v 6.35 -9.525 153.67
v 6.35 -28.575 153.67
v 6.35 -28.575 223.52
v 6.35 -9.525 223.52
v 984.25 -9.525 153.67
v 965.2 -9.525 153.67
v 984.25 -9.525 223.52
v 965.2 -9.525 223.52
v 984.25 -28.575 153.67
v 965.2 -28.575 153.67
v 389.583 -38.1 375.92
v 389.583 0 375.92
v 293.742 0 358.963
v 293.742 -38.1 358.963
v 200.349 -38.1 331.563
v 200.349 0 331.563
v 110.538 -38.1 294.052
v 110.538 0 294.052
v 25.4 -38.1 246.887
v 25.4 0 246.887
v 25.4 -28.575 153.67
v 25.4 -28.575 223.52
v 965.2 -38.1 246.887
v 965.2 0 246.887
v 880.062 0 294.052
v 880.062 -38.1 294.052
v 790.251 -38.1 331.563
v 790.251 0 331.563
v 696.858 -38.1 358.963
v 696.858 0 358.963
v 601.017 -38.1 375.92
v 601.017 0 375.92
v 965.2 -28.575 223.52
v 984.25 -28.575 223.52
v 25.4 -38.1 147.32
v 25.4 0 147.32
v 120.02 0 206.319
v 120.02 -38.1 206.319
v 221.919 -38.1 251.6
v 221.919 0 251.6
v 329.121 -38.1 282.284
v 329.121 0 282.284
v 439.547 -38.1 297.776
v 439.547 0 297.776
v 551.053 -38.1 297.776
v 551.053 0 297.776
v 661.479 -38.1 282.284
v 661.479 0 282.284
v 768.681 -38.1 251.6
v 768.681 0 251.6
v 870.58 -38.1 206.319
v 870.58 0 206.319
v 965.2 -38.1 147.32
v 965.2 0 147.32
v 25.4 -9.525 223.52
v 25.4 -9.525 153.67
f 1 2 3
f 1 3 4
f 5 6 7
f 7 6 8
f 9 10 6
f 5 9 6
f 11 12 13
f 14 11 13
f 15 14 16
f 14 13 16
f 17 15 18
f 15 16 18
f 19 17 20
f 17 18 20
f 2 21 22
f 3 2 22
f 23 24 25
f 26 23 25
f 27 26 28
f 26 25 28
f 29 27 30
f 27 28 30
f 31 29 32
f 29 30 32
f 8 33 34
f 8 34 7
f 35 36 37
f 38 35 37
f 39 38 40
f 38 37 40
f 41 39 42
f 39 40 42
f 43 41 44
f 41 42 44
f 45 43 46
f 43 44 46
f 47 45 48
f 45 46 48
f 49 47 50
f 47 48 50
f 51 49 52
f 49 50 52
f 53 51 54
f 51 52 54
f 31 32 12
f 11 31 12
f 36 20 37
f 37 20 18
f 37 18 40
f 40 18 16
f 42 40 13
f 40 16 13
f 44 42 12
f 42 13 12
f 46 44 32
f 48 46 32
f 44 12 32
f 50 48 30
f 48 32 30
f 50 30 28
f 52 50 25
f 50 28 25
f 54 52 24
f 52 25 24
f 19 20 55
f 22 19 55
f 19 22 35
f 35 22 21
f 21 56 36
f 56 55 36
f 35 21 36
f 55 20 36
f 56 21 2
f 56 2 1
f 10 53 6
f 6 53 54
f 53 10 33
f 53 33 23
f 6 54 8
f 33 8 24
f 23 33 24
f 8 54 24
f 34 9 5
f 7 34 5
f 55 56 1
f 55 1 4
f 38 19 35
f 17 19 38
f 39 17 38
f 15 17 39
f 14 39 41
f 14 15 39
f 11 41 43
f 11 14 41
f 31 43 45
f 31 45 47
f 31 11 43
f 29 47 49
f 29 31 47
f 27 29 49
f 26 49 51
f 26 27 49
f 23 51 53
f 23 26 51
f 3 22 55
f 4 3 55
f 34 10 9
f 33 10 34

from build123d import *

# Parameters (mm, degrees)
F1_DEPTH = 38.1
F2_W     = 19.05
F2_H     = 69.85
F3_DEPTH = 19.05


# Not quite as in the source:
# - a pattern or mirror of a feature is missing from the dataset's text; its kind, count and spacing are read off the source's solid


with BuildPart() as f1:
    # F0 (on Front) → F1 (new body)
    with BuildSketch(Plane.XZ):
        with BuildLine():
            ThreePointArc((25.4, 147.32), (495.3, 299.72), (965.2, 147.32))
            Line((965.2, 147.32), (965.2, 246.8872163374))
            ThreePointArc((965.2, 246.8872163374), (790.2509366907, 331.5626859382), (601.016852567, 375.92))
            Line((601.016852567, 375.92), (389.583147433, 375.92))
            ThreePointArc((389.583147433, 375.92), (200.3490633093, 331.5626859382), (25.4, 246.8872163374))
            Line((25.4, 246.8872163374), (25.4, 217.17))
            Line((25.4, 217.17), (25.4, 153.67))
            Line((25.4, 153.67), (25.4, 147.32))
        make_face()
    extrude(amount=F1_DEPTH)

    # F2 (on face) → F3 (join)
    with BuildSketch(Plane.YZ.offset(965.2)):
        with Locations((-19.05, 188.595)):
            Rectangle(F2_W, F2_H)
    f3 = extrude(amount=F3_DEPTH)

    # F3_copies: F3 across plane
    add(f3.mirror(Plane(origin=(495.3, 0, 0), x_dir=(0, 0, -1), z_dir=(-1, 0, 0))))


solid = f1.part
